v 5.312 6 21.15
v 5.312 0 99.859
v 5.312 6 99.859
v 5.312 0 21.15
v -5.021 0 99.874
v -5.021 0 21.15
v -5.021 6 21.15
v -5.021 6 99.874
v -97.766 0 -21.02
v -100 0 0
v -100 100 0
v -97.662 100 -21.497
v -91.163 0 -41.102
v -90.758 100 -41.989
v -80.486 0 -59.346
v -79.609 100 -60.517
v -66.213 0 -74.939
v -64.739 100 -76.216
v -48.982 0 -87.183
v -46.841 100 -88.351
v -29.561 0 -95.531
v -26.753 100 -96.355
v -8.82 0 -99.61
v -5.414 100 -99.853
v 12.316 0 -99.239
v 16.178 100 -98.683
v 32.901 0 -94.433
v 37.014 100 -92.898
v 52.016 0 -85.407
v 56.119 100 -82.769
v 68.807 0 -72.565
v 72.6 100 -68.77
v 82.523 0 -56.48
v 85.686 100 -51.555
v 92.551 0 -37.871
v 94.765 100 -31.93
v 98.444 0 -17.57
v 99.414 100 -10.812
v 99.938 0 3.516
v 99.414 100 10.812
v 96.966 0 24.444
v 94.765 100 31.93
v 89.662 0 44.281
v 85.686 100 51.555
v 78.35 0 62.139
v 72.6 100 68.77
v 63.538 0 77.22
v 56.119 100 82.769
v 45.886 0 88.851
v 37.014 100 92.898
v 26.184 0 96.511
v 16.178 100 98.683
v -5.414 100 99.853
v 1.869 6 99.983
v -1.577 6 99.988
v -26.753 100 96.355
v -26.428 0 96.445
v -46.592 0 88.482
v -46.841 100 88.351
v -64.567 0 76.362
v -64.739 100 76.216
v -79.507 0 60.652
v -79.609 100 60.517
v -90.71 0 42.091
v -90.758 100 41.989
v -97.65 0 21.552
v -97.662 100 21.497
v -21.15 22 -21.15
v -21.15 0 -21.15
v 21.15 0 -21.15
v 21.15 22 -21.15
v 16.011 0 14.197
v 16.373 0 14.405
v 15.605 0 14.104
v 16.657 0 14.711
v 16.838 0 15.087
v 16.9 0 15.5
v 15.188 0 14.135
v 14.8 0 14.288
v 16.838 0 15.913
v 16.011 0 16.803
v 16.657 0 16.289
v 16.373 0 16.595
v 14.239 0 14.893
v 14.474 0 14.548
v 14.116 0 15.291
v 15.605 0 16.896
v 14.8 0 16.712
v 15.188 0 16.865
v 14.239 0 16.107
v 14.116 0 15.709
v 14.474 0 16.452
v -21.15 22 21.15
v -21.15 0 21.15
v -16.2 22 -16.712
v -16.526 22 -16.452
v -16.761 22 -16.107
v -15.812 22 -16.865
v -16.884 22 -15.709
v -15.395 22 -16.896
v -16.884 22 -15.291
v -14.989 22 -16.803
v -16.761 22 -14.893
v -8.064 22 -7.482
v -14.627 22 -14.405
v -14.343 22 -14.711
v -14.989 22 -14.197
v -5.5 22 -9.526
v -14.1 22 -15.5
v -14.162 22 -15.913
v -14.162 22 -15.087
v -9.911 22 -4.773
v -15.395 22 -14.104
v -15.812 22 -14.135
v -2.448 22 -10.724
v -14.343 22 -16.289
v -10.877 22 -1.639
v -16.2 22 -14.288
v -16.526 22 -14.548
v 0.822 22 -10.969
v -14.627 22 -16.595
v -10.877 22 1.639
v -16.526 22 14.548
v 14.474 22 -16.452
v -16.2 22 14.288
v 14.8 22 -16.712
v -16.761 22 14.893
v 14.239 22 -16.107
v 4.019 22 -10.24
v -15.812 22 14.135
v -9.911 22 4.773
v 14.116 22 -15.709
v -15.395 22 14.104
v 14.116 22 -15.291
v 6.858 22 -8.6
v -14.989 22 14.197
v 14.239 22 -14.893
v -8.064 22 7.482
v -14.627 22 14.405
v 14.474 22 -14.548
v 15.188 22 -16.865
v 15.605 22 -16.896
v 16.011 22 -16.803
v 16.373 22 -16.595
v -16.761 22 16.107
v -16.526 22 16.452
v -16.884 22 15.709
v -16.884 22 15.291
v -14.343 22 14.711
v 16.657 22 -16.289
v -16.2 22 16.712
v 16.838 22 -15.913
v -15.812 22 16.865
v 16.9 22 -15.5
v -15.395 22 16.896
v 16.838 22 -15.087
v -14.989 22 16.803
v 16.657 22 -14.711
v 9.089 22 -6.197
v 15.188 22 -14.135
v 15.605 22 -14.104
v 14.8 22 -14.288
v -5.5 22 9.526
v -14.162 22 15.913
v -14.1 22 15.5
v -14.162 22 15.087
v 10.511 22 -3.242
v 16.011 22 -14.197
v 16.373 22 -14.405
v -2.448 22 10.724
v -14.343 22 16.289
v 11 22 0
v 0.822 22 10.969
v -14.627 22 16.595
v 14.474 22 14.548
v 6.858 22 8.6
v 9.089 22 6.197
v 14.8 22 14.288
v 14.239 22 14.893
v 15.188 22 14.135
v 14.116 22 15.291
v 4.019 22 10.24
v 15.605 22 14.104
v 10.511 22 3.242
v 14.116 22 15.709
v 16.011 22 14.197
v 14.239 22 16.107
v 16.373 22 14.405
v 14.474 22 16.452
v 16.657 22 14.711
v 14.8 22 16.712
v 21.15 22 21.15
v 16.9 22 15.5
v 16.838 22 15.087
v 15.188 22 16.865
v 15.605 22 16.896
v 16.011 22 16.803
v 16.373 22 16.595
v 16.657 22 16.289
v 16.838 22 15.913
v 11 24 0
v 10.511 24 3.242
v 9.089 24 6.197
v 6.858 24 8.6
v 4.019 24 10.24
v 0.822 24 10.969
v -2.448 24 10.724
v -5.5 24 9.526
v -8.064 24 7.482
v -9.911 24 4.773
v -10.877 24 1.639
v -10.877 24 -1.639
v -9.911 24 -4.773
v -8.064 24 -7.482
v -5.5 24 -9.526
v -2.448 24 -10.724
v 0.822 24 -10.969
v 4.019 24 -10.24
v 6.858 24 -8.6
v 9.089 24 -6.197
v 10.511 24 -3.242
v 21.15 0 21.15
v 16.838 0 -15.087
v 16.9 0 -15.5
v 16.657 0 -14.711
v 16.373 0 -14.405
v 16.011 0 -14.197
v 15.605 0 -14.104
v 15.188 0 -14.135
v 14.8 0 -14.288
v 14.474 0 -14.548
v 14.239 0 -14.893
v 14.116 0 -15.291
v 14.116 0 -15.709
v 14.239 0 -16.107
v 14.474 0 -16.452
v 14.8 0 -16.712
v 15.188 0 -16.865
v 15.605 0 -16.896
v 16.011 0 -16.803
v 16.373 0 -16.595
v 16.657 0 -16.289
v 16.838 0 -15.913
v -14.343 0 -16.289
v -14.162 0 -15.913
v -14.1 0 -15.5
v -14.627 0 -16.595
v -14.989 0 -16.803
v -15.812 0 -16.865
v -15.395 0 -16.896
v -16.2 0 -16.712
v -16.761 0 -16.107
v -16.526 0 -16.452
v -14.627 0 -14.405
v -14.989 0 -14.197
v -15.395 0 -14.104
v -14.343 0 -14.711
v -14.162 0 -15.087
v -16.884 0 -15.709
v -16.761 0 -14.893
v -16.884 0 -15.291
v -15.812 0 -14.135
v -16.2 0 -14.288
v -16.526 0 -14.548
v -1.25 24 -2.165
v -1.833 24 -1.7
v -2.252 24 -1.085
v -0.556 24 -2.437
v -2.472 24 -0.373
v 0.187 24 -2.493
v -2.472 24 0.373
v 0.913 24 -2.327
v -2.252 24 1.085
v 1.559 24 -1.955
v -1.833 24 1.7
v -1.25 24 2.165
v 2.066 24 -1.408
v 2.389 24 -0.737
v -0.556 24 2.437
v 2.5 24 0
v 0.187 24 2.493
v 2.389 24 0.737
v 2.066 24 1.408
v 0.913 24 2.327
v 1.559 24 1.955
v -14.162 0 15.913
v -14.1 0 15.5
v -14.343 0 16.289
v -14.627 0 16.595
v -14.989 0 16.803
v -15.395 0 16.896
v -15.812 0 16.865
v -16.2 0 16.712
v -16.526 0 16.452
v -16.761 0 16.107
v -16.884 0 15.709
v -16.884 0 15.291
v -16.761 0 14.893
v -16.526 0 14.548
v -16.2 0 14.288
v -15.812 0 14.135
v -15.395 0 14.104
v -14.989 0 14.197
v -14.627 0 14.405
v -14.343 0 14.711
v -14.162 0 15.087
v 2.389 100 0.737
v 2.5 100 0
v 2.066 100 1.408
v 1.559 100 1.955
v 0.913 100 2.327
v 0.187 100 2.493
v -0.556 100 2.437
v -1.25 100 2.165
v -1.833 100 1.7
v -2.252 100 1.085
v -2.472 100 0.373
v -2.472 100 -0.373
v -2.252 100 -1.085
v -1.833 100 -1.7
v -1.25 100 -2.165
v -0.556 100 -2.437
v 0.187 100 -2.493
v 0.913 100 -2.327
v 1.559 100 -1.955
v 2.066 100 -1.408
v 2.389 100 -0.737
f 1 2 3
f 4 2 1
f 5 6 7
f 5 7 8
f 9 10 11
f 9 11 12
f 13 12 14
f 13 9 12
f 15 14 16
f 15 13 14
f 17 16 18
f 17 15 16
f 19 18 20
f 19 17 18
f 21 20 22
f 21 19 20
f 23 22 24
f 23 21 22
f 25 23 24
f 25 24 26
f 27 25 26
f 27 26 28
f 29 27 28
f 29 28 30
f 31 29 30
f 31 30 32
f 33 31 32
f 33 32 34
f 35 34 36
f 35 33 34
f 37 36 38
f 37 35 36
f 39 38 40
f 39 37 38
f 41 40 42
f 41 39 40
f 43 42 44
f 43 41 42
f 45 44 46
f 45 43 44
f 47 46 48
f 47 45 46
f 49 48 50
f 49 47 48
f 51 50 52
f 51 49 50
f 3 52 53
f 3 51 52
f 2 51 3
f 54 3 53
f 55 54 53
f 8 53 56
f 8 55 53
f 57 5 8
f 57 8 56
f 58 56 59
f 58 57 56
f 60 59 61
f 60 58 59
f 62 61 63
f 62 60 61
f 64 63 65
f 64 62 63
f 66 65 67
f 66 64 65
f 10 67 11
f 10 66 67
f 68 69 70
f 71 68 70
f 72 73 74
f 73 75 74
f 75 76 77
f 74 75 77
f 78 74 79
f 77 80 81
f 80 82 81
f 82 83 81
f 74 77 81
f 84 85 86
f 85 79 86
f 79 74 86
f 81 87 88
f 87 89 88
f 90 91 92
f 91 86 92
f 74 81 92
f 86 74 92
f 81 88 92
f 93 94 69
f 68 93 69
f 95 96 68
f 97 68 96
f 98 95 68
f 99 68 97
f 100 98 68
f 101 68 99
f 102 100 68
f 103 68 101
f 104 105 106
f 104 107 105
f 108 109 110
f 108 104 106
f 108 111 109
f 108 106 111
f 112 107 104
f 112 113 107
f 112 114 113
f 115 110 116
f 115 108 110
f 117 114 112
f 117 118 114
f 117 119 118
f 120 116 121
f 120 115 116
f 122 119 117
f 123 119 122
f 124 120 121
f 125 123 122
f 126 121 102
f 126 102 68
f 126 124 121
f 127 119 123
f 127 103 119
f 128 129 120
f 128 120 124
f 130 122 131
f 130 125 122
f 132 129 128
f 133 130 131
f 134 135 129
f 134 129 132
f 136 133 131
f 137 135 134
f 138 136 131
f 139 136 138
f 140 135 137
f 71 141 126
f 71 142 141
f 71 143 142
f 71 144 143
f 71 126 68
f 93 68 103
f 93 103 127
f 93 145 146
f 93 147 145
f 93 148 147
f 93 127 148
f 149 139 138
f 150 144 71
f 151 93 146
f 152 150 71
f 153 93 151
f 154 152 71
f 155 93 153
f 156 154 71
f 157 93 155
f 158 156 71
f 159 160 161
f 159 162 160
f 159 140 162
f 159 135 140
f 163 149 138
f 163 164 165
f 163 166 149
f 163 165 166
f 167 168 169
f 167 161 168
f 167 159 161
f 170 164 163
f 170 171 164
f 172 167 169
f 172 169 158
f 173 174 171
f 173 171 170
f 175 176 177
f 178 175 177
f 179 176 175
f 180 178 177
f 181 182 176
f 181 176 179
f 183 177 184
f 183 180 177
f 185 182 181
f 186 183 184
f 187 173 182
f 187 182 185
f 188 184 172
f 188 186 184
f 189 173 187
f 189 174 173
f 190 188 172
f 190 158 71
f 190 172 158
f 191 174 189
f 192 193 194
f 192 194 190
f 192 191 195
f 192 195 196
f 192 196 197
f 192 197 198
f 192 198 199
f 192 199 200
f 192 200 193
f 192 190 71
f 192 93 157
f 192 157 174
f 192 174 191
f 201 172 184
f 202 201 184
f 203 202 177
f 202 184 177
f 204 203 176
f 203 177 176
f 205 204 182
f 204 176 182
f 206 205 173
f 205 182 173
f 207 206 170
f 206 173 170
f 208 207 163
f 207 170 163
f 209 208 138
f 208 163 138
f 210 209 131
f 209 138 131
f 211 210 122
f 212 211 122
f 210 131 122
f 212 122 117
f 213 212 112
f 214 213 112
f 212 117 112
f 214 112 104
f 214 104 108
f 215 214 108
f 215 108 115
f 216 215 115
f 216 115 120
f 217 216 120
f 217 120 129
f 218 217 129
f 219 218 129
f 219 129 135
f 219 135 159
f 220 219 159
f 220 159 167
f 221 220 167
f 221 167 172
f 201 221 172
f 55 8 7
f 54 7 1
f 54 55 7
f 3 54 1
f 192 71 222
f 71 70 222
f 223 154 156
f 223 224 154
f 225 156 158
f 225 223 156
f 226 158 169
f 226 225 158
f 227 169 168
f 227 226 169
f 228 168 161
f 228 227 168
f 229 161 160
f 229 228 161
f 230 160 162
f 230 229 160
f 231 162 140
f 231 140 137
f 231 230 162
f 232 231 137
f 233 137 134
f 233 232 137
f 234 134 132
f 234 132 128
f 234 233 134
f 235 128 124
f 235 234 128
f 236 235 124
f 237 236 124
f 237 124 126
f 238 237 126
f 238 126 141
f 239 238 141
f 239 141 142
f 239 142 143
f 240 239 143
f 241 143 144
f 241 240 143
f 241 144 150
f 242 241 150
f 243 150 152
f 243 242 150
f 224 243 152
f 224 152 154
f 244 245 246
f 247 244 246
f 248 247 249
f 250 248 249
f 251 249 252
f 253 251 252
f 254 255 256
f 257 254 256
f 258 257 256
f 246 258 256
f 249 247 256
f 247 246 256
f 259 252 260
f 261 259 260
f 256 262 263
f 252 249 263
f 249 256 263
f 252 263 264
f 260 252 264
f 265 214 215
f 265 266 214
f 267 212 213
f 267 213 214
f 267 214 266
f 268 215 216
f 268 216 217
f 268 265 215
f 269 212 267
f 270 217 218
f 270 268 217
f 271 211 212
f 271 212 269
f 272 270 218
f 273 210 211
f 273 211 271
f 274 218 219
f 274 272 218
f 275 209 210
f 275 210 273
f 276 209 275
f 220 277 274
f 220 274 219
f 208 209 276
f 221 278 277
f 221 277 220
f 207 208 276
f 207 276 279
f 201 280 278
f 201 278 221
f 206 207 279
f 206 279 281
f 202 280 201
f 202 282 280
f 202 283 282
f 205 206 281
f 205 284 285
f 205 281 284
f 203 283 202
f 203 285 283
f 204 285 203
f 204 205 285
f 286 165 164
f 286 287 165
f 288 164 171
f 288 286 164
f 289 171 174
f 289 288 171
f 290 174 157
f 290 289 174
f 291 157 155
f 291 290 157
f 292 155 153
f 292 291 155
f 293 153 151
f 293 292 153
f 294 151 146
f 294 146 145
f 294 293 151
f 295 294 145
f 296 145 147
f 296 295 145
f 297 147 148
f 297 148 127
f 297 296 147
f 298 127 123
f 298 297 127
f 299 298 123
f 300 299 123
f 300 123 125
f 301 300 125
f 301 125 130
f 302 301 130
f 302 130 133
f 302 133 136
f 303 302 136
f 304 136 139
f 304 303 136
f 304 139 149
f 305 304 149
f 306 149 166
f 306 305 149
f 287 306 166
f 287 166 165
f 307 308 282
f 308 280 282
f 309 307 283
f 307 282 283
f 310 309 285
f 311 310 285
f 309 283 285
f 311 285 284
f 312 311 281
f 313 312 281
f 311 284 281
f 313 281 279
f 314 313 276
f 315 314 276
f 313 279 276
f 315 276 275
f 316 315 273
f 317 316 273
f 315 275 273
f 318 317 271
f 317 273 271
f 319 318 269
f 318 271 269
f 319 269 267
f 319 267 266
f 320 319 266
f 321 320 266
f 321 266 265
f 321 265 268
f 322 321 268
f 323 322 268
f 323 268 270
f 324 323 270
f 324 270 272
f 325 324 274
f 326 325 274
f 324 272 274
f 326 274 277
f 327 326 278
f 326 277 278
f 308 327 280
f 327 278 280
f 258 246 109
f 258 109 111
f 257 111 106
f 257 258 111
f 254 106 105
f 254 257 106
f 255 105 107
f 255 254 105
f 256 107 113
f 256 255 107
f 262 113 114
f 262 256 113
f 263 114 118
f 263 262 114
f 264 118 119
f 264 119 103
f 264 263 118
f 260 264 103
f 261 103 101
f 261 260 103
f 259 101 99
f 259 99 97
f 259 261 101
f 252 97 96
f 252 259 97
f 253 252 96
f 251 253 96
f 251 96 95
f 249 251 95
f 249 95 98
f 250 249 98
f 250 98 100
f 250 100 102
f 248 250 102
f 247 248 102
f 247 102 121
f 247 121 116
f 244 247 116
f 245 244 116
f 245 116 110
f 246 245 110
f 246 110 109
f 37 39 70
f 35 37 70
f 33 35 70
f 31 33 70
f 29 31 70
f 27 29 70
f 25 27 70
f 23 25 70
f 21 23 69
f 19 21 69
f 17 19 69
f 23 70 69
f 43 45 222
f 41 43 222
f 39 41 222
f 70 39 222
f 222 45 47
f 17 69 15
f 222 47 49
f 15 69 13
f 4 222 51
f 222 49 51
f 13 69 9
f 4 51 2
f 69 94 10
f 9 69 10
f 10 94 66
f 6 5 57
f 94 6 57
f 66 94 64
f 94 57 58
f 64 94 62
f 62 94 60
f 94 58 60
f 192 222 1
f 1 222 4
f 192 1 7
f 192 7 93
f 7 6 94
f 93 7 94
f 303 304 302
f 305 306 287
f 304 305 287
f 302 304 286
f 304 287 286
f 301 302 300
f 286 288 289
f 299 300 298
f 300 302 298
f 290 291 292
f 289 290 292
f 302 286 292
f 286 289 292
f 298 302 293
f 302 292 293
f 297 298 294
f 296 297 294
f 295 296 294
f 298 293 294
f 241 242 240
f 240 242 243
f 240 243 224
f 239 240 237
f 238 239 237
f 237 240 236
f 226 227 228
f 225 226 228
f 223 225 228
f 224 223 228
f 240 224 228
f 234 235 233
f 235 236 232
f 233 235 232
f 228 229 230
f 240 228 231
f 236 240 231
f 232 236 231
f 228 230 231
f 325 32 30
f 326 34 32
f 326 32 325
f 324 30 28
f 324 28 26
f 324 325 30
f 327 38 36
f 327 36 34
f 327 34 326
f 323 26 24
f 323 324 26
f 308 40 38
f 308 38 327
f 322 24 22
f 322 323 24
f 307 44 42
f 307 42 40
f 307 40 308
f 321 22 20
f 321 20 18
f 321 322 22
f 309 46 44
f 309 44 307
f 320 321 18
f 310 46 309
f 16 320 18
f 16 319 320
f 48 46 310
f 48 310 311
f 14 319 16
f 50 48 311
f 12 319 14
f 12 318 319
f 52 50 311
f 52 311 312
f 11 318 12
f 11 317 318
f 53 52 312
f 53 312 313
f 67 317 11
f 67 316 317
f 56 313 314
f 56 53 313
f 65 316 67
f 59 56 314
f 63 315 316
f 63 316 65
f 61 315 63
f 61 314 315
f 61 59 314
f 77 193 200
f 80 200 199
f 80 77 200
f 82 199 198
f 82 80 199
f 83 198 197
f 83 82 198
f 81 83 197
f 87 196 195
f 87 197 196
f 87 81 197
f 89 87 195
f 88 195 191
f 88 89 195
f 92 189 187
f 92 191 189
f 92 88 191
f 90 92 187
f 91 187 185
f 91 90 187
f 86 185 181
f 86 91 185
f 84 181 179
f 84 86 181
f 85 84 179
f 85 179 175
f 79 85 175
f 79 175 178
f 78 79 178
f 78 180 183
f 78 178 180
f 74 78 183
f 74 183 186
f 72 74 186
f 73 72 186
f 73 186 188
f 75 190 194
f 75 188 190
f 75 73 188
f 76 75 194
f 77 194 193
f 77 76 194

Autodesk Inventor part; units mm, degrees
ref_plane "YZ Plane" through (0, 0, 0) normal (1, 0, 0) x (0, 1, 0)
ref_plane "XZ Plane" through (0, 0, 0) normal (0, 1, 0) x (-1, 0, 0)
ref_plane "XY Plane" through (0, 0, 0) normal (0, 0, 1) x (1, 0, 0)
sketch "Sketch1" plane through (0, 0, 0) normal (0, 1, 0) x (-1, 0, 0)
  circle A0 centre (0, 0) radius 100
  dimension "d0" = 200
extrude "Extrusion1" add sketch "Sketch1" along normal blind 100
sketch "Sketch2" plane through (0, 100, 0) normal (0, 1, 0) x (1, 0, 0)
  circle A0 centre (0, 0) radius 2.5
  dimension "d3" = 5
extrude "Extrusion2" cut sketch "Sketch2" along normal blind 22
sketch "Sketch6" plane through (0, 0, 0) normal (0, -1, 0) x (1, 0, 0)
  line L0 (15.5, 15.5) -> (-15.5, 15.5)
  line L1 (-15.5, 15.5) -> (-15.5, -15.5)
  line L2 (-15.5, -15.5) -> (15.5, -15.5)
  line L3 (15.5, -15.5) -> (15.5, 15.5)
  line L4 (15.5, 15.5) -> (-15.5, -15.5) construction
  line L5 (-15.5, 15.5) -> (15.5, -15.5) construction
  line L6 (21.15, 21.15) -> (-21.15, 21.15)
  line L7 (-21.15, 21.15) -> (-21.15, -21.15)
  line L8 (-21.15, -21.15) -> (21.15, -21.15)
  line L9 (21.15, -21.15) -> (21.15, 21.15)
  line L10 (21.15, 21.15) -> (-21.15, -21.15) construction
  line L11 (-21.15, 21.15) -> (21.15, -21.15) construction
  circle A0 centre (-15.5, -15.5) radius 1.4
  circle A1 centre (-15.5, 15.5) radius 1.4
  circle A2 centre (15.5, 15.5) radius 1.4
  circle A3 centre (15.5, -15.5) radius 1.4
  point P0 (0, 0)
  dimension "d18" = 31
  dimension "d19" = 31
  dimension "d21" = 42.3
  dimension "d22" = 42.3
  dimension "d23" = 2.8
  dimension "d24" = 2.8
  dimension "d25" = 2.8
  dimension "d26" = 2.8
extrude "Extrusion5" cut sketch "Sketch6" against normal blind 22 contours L0 A2 L3 A3 L2 A0 L1 A1 | L9 L8 L7 L6
sketch "Sketch7" plane through (0, 22, 0) normal (0, -1, 0) x (1, 0, 0)
  circle A0 centre (0, 0) radius 2.5 projected
  circle A1 centre (0, 0) radius 2.5
  dimension "d29" = 5
extrude "Extrusion6" cut sketch "Sketch7" against normal blind 80
sketch "Sketch8" plane through (0, 22, 0) normal (0, -1, 0) x (1, 0, 0)
  circle A0 centre (0, 0) radius 11
  dimension "d32" = 22
extrude "Extrusion7" cut sketch "Sketch8" against normal blind 2
sketch "Sketch9" plane through (0, 0, 0) normal (0, -1, 0) x (1, 0, 0)
  line L0 (-21.15, 21.15) -> (21.15, 21.15) projected
  circle A0 centre (0, 0) radius 100 projected
  line L1 (5.3123, 21.15) -> (-5.021, 21.15)
  line L2 (-5.021, 99.8739) -> (5.3123, 99.8739)
  line L3 (-5.021, 21.15) -> (-0.021, 21.15)
  line L4 (-0.021, 99.8739) -> (-5.021, 99.8739)
  line L5 (5.3123, 21.15) -> (-5.021, 21.15)
  line L6 (-5.021, 21.15) -> (-5.021, 99.8739)
  line L7 (-5.021, 99.8739) -> (5.3123, 99.8739)
  line L8 (5.3123, 99.8739) -> (5.3123, 21.15)
  arc A1 (5.3123, 99.8739) -> (-5.021, 99.8739) centre (0.1457, 63.1234) ccw
  point P0 (5.021, 99.8739)
  point P1 (5.3123, 99.8588)
  dimension "d40" = 78.7239
extrude "Extrusion8" cut sketch "Sketch9" against normal blind 6 contours L6 L2 A0 L8 L0 | A1 L2 A0 | A0 L2
equation "\"d24\" = d23"
equation "\"d25\" = d23"
equation "\"d26\" = d23"
properties part number "Base"
